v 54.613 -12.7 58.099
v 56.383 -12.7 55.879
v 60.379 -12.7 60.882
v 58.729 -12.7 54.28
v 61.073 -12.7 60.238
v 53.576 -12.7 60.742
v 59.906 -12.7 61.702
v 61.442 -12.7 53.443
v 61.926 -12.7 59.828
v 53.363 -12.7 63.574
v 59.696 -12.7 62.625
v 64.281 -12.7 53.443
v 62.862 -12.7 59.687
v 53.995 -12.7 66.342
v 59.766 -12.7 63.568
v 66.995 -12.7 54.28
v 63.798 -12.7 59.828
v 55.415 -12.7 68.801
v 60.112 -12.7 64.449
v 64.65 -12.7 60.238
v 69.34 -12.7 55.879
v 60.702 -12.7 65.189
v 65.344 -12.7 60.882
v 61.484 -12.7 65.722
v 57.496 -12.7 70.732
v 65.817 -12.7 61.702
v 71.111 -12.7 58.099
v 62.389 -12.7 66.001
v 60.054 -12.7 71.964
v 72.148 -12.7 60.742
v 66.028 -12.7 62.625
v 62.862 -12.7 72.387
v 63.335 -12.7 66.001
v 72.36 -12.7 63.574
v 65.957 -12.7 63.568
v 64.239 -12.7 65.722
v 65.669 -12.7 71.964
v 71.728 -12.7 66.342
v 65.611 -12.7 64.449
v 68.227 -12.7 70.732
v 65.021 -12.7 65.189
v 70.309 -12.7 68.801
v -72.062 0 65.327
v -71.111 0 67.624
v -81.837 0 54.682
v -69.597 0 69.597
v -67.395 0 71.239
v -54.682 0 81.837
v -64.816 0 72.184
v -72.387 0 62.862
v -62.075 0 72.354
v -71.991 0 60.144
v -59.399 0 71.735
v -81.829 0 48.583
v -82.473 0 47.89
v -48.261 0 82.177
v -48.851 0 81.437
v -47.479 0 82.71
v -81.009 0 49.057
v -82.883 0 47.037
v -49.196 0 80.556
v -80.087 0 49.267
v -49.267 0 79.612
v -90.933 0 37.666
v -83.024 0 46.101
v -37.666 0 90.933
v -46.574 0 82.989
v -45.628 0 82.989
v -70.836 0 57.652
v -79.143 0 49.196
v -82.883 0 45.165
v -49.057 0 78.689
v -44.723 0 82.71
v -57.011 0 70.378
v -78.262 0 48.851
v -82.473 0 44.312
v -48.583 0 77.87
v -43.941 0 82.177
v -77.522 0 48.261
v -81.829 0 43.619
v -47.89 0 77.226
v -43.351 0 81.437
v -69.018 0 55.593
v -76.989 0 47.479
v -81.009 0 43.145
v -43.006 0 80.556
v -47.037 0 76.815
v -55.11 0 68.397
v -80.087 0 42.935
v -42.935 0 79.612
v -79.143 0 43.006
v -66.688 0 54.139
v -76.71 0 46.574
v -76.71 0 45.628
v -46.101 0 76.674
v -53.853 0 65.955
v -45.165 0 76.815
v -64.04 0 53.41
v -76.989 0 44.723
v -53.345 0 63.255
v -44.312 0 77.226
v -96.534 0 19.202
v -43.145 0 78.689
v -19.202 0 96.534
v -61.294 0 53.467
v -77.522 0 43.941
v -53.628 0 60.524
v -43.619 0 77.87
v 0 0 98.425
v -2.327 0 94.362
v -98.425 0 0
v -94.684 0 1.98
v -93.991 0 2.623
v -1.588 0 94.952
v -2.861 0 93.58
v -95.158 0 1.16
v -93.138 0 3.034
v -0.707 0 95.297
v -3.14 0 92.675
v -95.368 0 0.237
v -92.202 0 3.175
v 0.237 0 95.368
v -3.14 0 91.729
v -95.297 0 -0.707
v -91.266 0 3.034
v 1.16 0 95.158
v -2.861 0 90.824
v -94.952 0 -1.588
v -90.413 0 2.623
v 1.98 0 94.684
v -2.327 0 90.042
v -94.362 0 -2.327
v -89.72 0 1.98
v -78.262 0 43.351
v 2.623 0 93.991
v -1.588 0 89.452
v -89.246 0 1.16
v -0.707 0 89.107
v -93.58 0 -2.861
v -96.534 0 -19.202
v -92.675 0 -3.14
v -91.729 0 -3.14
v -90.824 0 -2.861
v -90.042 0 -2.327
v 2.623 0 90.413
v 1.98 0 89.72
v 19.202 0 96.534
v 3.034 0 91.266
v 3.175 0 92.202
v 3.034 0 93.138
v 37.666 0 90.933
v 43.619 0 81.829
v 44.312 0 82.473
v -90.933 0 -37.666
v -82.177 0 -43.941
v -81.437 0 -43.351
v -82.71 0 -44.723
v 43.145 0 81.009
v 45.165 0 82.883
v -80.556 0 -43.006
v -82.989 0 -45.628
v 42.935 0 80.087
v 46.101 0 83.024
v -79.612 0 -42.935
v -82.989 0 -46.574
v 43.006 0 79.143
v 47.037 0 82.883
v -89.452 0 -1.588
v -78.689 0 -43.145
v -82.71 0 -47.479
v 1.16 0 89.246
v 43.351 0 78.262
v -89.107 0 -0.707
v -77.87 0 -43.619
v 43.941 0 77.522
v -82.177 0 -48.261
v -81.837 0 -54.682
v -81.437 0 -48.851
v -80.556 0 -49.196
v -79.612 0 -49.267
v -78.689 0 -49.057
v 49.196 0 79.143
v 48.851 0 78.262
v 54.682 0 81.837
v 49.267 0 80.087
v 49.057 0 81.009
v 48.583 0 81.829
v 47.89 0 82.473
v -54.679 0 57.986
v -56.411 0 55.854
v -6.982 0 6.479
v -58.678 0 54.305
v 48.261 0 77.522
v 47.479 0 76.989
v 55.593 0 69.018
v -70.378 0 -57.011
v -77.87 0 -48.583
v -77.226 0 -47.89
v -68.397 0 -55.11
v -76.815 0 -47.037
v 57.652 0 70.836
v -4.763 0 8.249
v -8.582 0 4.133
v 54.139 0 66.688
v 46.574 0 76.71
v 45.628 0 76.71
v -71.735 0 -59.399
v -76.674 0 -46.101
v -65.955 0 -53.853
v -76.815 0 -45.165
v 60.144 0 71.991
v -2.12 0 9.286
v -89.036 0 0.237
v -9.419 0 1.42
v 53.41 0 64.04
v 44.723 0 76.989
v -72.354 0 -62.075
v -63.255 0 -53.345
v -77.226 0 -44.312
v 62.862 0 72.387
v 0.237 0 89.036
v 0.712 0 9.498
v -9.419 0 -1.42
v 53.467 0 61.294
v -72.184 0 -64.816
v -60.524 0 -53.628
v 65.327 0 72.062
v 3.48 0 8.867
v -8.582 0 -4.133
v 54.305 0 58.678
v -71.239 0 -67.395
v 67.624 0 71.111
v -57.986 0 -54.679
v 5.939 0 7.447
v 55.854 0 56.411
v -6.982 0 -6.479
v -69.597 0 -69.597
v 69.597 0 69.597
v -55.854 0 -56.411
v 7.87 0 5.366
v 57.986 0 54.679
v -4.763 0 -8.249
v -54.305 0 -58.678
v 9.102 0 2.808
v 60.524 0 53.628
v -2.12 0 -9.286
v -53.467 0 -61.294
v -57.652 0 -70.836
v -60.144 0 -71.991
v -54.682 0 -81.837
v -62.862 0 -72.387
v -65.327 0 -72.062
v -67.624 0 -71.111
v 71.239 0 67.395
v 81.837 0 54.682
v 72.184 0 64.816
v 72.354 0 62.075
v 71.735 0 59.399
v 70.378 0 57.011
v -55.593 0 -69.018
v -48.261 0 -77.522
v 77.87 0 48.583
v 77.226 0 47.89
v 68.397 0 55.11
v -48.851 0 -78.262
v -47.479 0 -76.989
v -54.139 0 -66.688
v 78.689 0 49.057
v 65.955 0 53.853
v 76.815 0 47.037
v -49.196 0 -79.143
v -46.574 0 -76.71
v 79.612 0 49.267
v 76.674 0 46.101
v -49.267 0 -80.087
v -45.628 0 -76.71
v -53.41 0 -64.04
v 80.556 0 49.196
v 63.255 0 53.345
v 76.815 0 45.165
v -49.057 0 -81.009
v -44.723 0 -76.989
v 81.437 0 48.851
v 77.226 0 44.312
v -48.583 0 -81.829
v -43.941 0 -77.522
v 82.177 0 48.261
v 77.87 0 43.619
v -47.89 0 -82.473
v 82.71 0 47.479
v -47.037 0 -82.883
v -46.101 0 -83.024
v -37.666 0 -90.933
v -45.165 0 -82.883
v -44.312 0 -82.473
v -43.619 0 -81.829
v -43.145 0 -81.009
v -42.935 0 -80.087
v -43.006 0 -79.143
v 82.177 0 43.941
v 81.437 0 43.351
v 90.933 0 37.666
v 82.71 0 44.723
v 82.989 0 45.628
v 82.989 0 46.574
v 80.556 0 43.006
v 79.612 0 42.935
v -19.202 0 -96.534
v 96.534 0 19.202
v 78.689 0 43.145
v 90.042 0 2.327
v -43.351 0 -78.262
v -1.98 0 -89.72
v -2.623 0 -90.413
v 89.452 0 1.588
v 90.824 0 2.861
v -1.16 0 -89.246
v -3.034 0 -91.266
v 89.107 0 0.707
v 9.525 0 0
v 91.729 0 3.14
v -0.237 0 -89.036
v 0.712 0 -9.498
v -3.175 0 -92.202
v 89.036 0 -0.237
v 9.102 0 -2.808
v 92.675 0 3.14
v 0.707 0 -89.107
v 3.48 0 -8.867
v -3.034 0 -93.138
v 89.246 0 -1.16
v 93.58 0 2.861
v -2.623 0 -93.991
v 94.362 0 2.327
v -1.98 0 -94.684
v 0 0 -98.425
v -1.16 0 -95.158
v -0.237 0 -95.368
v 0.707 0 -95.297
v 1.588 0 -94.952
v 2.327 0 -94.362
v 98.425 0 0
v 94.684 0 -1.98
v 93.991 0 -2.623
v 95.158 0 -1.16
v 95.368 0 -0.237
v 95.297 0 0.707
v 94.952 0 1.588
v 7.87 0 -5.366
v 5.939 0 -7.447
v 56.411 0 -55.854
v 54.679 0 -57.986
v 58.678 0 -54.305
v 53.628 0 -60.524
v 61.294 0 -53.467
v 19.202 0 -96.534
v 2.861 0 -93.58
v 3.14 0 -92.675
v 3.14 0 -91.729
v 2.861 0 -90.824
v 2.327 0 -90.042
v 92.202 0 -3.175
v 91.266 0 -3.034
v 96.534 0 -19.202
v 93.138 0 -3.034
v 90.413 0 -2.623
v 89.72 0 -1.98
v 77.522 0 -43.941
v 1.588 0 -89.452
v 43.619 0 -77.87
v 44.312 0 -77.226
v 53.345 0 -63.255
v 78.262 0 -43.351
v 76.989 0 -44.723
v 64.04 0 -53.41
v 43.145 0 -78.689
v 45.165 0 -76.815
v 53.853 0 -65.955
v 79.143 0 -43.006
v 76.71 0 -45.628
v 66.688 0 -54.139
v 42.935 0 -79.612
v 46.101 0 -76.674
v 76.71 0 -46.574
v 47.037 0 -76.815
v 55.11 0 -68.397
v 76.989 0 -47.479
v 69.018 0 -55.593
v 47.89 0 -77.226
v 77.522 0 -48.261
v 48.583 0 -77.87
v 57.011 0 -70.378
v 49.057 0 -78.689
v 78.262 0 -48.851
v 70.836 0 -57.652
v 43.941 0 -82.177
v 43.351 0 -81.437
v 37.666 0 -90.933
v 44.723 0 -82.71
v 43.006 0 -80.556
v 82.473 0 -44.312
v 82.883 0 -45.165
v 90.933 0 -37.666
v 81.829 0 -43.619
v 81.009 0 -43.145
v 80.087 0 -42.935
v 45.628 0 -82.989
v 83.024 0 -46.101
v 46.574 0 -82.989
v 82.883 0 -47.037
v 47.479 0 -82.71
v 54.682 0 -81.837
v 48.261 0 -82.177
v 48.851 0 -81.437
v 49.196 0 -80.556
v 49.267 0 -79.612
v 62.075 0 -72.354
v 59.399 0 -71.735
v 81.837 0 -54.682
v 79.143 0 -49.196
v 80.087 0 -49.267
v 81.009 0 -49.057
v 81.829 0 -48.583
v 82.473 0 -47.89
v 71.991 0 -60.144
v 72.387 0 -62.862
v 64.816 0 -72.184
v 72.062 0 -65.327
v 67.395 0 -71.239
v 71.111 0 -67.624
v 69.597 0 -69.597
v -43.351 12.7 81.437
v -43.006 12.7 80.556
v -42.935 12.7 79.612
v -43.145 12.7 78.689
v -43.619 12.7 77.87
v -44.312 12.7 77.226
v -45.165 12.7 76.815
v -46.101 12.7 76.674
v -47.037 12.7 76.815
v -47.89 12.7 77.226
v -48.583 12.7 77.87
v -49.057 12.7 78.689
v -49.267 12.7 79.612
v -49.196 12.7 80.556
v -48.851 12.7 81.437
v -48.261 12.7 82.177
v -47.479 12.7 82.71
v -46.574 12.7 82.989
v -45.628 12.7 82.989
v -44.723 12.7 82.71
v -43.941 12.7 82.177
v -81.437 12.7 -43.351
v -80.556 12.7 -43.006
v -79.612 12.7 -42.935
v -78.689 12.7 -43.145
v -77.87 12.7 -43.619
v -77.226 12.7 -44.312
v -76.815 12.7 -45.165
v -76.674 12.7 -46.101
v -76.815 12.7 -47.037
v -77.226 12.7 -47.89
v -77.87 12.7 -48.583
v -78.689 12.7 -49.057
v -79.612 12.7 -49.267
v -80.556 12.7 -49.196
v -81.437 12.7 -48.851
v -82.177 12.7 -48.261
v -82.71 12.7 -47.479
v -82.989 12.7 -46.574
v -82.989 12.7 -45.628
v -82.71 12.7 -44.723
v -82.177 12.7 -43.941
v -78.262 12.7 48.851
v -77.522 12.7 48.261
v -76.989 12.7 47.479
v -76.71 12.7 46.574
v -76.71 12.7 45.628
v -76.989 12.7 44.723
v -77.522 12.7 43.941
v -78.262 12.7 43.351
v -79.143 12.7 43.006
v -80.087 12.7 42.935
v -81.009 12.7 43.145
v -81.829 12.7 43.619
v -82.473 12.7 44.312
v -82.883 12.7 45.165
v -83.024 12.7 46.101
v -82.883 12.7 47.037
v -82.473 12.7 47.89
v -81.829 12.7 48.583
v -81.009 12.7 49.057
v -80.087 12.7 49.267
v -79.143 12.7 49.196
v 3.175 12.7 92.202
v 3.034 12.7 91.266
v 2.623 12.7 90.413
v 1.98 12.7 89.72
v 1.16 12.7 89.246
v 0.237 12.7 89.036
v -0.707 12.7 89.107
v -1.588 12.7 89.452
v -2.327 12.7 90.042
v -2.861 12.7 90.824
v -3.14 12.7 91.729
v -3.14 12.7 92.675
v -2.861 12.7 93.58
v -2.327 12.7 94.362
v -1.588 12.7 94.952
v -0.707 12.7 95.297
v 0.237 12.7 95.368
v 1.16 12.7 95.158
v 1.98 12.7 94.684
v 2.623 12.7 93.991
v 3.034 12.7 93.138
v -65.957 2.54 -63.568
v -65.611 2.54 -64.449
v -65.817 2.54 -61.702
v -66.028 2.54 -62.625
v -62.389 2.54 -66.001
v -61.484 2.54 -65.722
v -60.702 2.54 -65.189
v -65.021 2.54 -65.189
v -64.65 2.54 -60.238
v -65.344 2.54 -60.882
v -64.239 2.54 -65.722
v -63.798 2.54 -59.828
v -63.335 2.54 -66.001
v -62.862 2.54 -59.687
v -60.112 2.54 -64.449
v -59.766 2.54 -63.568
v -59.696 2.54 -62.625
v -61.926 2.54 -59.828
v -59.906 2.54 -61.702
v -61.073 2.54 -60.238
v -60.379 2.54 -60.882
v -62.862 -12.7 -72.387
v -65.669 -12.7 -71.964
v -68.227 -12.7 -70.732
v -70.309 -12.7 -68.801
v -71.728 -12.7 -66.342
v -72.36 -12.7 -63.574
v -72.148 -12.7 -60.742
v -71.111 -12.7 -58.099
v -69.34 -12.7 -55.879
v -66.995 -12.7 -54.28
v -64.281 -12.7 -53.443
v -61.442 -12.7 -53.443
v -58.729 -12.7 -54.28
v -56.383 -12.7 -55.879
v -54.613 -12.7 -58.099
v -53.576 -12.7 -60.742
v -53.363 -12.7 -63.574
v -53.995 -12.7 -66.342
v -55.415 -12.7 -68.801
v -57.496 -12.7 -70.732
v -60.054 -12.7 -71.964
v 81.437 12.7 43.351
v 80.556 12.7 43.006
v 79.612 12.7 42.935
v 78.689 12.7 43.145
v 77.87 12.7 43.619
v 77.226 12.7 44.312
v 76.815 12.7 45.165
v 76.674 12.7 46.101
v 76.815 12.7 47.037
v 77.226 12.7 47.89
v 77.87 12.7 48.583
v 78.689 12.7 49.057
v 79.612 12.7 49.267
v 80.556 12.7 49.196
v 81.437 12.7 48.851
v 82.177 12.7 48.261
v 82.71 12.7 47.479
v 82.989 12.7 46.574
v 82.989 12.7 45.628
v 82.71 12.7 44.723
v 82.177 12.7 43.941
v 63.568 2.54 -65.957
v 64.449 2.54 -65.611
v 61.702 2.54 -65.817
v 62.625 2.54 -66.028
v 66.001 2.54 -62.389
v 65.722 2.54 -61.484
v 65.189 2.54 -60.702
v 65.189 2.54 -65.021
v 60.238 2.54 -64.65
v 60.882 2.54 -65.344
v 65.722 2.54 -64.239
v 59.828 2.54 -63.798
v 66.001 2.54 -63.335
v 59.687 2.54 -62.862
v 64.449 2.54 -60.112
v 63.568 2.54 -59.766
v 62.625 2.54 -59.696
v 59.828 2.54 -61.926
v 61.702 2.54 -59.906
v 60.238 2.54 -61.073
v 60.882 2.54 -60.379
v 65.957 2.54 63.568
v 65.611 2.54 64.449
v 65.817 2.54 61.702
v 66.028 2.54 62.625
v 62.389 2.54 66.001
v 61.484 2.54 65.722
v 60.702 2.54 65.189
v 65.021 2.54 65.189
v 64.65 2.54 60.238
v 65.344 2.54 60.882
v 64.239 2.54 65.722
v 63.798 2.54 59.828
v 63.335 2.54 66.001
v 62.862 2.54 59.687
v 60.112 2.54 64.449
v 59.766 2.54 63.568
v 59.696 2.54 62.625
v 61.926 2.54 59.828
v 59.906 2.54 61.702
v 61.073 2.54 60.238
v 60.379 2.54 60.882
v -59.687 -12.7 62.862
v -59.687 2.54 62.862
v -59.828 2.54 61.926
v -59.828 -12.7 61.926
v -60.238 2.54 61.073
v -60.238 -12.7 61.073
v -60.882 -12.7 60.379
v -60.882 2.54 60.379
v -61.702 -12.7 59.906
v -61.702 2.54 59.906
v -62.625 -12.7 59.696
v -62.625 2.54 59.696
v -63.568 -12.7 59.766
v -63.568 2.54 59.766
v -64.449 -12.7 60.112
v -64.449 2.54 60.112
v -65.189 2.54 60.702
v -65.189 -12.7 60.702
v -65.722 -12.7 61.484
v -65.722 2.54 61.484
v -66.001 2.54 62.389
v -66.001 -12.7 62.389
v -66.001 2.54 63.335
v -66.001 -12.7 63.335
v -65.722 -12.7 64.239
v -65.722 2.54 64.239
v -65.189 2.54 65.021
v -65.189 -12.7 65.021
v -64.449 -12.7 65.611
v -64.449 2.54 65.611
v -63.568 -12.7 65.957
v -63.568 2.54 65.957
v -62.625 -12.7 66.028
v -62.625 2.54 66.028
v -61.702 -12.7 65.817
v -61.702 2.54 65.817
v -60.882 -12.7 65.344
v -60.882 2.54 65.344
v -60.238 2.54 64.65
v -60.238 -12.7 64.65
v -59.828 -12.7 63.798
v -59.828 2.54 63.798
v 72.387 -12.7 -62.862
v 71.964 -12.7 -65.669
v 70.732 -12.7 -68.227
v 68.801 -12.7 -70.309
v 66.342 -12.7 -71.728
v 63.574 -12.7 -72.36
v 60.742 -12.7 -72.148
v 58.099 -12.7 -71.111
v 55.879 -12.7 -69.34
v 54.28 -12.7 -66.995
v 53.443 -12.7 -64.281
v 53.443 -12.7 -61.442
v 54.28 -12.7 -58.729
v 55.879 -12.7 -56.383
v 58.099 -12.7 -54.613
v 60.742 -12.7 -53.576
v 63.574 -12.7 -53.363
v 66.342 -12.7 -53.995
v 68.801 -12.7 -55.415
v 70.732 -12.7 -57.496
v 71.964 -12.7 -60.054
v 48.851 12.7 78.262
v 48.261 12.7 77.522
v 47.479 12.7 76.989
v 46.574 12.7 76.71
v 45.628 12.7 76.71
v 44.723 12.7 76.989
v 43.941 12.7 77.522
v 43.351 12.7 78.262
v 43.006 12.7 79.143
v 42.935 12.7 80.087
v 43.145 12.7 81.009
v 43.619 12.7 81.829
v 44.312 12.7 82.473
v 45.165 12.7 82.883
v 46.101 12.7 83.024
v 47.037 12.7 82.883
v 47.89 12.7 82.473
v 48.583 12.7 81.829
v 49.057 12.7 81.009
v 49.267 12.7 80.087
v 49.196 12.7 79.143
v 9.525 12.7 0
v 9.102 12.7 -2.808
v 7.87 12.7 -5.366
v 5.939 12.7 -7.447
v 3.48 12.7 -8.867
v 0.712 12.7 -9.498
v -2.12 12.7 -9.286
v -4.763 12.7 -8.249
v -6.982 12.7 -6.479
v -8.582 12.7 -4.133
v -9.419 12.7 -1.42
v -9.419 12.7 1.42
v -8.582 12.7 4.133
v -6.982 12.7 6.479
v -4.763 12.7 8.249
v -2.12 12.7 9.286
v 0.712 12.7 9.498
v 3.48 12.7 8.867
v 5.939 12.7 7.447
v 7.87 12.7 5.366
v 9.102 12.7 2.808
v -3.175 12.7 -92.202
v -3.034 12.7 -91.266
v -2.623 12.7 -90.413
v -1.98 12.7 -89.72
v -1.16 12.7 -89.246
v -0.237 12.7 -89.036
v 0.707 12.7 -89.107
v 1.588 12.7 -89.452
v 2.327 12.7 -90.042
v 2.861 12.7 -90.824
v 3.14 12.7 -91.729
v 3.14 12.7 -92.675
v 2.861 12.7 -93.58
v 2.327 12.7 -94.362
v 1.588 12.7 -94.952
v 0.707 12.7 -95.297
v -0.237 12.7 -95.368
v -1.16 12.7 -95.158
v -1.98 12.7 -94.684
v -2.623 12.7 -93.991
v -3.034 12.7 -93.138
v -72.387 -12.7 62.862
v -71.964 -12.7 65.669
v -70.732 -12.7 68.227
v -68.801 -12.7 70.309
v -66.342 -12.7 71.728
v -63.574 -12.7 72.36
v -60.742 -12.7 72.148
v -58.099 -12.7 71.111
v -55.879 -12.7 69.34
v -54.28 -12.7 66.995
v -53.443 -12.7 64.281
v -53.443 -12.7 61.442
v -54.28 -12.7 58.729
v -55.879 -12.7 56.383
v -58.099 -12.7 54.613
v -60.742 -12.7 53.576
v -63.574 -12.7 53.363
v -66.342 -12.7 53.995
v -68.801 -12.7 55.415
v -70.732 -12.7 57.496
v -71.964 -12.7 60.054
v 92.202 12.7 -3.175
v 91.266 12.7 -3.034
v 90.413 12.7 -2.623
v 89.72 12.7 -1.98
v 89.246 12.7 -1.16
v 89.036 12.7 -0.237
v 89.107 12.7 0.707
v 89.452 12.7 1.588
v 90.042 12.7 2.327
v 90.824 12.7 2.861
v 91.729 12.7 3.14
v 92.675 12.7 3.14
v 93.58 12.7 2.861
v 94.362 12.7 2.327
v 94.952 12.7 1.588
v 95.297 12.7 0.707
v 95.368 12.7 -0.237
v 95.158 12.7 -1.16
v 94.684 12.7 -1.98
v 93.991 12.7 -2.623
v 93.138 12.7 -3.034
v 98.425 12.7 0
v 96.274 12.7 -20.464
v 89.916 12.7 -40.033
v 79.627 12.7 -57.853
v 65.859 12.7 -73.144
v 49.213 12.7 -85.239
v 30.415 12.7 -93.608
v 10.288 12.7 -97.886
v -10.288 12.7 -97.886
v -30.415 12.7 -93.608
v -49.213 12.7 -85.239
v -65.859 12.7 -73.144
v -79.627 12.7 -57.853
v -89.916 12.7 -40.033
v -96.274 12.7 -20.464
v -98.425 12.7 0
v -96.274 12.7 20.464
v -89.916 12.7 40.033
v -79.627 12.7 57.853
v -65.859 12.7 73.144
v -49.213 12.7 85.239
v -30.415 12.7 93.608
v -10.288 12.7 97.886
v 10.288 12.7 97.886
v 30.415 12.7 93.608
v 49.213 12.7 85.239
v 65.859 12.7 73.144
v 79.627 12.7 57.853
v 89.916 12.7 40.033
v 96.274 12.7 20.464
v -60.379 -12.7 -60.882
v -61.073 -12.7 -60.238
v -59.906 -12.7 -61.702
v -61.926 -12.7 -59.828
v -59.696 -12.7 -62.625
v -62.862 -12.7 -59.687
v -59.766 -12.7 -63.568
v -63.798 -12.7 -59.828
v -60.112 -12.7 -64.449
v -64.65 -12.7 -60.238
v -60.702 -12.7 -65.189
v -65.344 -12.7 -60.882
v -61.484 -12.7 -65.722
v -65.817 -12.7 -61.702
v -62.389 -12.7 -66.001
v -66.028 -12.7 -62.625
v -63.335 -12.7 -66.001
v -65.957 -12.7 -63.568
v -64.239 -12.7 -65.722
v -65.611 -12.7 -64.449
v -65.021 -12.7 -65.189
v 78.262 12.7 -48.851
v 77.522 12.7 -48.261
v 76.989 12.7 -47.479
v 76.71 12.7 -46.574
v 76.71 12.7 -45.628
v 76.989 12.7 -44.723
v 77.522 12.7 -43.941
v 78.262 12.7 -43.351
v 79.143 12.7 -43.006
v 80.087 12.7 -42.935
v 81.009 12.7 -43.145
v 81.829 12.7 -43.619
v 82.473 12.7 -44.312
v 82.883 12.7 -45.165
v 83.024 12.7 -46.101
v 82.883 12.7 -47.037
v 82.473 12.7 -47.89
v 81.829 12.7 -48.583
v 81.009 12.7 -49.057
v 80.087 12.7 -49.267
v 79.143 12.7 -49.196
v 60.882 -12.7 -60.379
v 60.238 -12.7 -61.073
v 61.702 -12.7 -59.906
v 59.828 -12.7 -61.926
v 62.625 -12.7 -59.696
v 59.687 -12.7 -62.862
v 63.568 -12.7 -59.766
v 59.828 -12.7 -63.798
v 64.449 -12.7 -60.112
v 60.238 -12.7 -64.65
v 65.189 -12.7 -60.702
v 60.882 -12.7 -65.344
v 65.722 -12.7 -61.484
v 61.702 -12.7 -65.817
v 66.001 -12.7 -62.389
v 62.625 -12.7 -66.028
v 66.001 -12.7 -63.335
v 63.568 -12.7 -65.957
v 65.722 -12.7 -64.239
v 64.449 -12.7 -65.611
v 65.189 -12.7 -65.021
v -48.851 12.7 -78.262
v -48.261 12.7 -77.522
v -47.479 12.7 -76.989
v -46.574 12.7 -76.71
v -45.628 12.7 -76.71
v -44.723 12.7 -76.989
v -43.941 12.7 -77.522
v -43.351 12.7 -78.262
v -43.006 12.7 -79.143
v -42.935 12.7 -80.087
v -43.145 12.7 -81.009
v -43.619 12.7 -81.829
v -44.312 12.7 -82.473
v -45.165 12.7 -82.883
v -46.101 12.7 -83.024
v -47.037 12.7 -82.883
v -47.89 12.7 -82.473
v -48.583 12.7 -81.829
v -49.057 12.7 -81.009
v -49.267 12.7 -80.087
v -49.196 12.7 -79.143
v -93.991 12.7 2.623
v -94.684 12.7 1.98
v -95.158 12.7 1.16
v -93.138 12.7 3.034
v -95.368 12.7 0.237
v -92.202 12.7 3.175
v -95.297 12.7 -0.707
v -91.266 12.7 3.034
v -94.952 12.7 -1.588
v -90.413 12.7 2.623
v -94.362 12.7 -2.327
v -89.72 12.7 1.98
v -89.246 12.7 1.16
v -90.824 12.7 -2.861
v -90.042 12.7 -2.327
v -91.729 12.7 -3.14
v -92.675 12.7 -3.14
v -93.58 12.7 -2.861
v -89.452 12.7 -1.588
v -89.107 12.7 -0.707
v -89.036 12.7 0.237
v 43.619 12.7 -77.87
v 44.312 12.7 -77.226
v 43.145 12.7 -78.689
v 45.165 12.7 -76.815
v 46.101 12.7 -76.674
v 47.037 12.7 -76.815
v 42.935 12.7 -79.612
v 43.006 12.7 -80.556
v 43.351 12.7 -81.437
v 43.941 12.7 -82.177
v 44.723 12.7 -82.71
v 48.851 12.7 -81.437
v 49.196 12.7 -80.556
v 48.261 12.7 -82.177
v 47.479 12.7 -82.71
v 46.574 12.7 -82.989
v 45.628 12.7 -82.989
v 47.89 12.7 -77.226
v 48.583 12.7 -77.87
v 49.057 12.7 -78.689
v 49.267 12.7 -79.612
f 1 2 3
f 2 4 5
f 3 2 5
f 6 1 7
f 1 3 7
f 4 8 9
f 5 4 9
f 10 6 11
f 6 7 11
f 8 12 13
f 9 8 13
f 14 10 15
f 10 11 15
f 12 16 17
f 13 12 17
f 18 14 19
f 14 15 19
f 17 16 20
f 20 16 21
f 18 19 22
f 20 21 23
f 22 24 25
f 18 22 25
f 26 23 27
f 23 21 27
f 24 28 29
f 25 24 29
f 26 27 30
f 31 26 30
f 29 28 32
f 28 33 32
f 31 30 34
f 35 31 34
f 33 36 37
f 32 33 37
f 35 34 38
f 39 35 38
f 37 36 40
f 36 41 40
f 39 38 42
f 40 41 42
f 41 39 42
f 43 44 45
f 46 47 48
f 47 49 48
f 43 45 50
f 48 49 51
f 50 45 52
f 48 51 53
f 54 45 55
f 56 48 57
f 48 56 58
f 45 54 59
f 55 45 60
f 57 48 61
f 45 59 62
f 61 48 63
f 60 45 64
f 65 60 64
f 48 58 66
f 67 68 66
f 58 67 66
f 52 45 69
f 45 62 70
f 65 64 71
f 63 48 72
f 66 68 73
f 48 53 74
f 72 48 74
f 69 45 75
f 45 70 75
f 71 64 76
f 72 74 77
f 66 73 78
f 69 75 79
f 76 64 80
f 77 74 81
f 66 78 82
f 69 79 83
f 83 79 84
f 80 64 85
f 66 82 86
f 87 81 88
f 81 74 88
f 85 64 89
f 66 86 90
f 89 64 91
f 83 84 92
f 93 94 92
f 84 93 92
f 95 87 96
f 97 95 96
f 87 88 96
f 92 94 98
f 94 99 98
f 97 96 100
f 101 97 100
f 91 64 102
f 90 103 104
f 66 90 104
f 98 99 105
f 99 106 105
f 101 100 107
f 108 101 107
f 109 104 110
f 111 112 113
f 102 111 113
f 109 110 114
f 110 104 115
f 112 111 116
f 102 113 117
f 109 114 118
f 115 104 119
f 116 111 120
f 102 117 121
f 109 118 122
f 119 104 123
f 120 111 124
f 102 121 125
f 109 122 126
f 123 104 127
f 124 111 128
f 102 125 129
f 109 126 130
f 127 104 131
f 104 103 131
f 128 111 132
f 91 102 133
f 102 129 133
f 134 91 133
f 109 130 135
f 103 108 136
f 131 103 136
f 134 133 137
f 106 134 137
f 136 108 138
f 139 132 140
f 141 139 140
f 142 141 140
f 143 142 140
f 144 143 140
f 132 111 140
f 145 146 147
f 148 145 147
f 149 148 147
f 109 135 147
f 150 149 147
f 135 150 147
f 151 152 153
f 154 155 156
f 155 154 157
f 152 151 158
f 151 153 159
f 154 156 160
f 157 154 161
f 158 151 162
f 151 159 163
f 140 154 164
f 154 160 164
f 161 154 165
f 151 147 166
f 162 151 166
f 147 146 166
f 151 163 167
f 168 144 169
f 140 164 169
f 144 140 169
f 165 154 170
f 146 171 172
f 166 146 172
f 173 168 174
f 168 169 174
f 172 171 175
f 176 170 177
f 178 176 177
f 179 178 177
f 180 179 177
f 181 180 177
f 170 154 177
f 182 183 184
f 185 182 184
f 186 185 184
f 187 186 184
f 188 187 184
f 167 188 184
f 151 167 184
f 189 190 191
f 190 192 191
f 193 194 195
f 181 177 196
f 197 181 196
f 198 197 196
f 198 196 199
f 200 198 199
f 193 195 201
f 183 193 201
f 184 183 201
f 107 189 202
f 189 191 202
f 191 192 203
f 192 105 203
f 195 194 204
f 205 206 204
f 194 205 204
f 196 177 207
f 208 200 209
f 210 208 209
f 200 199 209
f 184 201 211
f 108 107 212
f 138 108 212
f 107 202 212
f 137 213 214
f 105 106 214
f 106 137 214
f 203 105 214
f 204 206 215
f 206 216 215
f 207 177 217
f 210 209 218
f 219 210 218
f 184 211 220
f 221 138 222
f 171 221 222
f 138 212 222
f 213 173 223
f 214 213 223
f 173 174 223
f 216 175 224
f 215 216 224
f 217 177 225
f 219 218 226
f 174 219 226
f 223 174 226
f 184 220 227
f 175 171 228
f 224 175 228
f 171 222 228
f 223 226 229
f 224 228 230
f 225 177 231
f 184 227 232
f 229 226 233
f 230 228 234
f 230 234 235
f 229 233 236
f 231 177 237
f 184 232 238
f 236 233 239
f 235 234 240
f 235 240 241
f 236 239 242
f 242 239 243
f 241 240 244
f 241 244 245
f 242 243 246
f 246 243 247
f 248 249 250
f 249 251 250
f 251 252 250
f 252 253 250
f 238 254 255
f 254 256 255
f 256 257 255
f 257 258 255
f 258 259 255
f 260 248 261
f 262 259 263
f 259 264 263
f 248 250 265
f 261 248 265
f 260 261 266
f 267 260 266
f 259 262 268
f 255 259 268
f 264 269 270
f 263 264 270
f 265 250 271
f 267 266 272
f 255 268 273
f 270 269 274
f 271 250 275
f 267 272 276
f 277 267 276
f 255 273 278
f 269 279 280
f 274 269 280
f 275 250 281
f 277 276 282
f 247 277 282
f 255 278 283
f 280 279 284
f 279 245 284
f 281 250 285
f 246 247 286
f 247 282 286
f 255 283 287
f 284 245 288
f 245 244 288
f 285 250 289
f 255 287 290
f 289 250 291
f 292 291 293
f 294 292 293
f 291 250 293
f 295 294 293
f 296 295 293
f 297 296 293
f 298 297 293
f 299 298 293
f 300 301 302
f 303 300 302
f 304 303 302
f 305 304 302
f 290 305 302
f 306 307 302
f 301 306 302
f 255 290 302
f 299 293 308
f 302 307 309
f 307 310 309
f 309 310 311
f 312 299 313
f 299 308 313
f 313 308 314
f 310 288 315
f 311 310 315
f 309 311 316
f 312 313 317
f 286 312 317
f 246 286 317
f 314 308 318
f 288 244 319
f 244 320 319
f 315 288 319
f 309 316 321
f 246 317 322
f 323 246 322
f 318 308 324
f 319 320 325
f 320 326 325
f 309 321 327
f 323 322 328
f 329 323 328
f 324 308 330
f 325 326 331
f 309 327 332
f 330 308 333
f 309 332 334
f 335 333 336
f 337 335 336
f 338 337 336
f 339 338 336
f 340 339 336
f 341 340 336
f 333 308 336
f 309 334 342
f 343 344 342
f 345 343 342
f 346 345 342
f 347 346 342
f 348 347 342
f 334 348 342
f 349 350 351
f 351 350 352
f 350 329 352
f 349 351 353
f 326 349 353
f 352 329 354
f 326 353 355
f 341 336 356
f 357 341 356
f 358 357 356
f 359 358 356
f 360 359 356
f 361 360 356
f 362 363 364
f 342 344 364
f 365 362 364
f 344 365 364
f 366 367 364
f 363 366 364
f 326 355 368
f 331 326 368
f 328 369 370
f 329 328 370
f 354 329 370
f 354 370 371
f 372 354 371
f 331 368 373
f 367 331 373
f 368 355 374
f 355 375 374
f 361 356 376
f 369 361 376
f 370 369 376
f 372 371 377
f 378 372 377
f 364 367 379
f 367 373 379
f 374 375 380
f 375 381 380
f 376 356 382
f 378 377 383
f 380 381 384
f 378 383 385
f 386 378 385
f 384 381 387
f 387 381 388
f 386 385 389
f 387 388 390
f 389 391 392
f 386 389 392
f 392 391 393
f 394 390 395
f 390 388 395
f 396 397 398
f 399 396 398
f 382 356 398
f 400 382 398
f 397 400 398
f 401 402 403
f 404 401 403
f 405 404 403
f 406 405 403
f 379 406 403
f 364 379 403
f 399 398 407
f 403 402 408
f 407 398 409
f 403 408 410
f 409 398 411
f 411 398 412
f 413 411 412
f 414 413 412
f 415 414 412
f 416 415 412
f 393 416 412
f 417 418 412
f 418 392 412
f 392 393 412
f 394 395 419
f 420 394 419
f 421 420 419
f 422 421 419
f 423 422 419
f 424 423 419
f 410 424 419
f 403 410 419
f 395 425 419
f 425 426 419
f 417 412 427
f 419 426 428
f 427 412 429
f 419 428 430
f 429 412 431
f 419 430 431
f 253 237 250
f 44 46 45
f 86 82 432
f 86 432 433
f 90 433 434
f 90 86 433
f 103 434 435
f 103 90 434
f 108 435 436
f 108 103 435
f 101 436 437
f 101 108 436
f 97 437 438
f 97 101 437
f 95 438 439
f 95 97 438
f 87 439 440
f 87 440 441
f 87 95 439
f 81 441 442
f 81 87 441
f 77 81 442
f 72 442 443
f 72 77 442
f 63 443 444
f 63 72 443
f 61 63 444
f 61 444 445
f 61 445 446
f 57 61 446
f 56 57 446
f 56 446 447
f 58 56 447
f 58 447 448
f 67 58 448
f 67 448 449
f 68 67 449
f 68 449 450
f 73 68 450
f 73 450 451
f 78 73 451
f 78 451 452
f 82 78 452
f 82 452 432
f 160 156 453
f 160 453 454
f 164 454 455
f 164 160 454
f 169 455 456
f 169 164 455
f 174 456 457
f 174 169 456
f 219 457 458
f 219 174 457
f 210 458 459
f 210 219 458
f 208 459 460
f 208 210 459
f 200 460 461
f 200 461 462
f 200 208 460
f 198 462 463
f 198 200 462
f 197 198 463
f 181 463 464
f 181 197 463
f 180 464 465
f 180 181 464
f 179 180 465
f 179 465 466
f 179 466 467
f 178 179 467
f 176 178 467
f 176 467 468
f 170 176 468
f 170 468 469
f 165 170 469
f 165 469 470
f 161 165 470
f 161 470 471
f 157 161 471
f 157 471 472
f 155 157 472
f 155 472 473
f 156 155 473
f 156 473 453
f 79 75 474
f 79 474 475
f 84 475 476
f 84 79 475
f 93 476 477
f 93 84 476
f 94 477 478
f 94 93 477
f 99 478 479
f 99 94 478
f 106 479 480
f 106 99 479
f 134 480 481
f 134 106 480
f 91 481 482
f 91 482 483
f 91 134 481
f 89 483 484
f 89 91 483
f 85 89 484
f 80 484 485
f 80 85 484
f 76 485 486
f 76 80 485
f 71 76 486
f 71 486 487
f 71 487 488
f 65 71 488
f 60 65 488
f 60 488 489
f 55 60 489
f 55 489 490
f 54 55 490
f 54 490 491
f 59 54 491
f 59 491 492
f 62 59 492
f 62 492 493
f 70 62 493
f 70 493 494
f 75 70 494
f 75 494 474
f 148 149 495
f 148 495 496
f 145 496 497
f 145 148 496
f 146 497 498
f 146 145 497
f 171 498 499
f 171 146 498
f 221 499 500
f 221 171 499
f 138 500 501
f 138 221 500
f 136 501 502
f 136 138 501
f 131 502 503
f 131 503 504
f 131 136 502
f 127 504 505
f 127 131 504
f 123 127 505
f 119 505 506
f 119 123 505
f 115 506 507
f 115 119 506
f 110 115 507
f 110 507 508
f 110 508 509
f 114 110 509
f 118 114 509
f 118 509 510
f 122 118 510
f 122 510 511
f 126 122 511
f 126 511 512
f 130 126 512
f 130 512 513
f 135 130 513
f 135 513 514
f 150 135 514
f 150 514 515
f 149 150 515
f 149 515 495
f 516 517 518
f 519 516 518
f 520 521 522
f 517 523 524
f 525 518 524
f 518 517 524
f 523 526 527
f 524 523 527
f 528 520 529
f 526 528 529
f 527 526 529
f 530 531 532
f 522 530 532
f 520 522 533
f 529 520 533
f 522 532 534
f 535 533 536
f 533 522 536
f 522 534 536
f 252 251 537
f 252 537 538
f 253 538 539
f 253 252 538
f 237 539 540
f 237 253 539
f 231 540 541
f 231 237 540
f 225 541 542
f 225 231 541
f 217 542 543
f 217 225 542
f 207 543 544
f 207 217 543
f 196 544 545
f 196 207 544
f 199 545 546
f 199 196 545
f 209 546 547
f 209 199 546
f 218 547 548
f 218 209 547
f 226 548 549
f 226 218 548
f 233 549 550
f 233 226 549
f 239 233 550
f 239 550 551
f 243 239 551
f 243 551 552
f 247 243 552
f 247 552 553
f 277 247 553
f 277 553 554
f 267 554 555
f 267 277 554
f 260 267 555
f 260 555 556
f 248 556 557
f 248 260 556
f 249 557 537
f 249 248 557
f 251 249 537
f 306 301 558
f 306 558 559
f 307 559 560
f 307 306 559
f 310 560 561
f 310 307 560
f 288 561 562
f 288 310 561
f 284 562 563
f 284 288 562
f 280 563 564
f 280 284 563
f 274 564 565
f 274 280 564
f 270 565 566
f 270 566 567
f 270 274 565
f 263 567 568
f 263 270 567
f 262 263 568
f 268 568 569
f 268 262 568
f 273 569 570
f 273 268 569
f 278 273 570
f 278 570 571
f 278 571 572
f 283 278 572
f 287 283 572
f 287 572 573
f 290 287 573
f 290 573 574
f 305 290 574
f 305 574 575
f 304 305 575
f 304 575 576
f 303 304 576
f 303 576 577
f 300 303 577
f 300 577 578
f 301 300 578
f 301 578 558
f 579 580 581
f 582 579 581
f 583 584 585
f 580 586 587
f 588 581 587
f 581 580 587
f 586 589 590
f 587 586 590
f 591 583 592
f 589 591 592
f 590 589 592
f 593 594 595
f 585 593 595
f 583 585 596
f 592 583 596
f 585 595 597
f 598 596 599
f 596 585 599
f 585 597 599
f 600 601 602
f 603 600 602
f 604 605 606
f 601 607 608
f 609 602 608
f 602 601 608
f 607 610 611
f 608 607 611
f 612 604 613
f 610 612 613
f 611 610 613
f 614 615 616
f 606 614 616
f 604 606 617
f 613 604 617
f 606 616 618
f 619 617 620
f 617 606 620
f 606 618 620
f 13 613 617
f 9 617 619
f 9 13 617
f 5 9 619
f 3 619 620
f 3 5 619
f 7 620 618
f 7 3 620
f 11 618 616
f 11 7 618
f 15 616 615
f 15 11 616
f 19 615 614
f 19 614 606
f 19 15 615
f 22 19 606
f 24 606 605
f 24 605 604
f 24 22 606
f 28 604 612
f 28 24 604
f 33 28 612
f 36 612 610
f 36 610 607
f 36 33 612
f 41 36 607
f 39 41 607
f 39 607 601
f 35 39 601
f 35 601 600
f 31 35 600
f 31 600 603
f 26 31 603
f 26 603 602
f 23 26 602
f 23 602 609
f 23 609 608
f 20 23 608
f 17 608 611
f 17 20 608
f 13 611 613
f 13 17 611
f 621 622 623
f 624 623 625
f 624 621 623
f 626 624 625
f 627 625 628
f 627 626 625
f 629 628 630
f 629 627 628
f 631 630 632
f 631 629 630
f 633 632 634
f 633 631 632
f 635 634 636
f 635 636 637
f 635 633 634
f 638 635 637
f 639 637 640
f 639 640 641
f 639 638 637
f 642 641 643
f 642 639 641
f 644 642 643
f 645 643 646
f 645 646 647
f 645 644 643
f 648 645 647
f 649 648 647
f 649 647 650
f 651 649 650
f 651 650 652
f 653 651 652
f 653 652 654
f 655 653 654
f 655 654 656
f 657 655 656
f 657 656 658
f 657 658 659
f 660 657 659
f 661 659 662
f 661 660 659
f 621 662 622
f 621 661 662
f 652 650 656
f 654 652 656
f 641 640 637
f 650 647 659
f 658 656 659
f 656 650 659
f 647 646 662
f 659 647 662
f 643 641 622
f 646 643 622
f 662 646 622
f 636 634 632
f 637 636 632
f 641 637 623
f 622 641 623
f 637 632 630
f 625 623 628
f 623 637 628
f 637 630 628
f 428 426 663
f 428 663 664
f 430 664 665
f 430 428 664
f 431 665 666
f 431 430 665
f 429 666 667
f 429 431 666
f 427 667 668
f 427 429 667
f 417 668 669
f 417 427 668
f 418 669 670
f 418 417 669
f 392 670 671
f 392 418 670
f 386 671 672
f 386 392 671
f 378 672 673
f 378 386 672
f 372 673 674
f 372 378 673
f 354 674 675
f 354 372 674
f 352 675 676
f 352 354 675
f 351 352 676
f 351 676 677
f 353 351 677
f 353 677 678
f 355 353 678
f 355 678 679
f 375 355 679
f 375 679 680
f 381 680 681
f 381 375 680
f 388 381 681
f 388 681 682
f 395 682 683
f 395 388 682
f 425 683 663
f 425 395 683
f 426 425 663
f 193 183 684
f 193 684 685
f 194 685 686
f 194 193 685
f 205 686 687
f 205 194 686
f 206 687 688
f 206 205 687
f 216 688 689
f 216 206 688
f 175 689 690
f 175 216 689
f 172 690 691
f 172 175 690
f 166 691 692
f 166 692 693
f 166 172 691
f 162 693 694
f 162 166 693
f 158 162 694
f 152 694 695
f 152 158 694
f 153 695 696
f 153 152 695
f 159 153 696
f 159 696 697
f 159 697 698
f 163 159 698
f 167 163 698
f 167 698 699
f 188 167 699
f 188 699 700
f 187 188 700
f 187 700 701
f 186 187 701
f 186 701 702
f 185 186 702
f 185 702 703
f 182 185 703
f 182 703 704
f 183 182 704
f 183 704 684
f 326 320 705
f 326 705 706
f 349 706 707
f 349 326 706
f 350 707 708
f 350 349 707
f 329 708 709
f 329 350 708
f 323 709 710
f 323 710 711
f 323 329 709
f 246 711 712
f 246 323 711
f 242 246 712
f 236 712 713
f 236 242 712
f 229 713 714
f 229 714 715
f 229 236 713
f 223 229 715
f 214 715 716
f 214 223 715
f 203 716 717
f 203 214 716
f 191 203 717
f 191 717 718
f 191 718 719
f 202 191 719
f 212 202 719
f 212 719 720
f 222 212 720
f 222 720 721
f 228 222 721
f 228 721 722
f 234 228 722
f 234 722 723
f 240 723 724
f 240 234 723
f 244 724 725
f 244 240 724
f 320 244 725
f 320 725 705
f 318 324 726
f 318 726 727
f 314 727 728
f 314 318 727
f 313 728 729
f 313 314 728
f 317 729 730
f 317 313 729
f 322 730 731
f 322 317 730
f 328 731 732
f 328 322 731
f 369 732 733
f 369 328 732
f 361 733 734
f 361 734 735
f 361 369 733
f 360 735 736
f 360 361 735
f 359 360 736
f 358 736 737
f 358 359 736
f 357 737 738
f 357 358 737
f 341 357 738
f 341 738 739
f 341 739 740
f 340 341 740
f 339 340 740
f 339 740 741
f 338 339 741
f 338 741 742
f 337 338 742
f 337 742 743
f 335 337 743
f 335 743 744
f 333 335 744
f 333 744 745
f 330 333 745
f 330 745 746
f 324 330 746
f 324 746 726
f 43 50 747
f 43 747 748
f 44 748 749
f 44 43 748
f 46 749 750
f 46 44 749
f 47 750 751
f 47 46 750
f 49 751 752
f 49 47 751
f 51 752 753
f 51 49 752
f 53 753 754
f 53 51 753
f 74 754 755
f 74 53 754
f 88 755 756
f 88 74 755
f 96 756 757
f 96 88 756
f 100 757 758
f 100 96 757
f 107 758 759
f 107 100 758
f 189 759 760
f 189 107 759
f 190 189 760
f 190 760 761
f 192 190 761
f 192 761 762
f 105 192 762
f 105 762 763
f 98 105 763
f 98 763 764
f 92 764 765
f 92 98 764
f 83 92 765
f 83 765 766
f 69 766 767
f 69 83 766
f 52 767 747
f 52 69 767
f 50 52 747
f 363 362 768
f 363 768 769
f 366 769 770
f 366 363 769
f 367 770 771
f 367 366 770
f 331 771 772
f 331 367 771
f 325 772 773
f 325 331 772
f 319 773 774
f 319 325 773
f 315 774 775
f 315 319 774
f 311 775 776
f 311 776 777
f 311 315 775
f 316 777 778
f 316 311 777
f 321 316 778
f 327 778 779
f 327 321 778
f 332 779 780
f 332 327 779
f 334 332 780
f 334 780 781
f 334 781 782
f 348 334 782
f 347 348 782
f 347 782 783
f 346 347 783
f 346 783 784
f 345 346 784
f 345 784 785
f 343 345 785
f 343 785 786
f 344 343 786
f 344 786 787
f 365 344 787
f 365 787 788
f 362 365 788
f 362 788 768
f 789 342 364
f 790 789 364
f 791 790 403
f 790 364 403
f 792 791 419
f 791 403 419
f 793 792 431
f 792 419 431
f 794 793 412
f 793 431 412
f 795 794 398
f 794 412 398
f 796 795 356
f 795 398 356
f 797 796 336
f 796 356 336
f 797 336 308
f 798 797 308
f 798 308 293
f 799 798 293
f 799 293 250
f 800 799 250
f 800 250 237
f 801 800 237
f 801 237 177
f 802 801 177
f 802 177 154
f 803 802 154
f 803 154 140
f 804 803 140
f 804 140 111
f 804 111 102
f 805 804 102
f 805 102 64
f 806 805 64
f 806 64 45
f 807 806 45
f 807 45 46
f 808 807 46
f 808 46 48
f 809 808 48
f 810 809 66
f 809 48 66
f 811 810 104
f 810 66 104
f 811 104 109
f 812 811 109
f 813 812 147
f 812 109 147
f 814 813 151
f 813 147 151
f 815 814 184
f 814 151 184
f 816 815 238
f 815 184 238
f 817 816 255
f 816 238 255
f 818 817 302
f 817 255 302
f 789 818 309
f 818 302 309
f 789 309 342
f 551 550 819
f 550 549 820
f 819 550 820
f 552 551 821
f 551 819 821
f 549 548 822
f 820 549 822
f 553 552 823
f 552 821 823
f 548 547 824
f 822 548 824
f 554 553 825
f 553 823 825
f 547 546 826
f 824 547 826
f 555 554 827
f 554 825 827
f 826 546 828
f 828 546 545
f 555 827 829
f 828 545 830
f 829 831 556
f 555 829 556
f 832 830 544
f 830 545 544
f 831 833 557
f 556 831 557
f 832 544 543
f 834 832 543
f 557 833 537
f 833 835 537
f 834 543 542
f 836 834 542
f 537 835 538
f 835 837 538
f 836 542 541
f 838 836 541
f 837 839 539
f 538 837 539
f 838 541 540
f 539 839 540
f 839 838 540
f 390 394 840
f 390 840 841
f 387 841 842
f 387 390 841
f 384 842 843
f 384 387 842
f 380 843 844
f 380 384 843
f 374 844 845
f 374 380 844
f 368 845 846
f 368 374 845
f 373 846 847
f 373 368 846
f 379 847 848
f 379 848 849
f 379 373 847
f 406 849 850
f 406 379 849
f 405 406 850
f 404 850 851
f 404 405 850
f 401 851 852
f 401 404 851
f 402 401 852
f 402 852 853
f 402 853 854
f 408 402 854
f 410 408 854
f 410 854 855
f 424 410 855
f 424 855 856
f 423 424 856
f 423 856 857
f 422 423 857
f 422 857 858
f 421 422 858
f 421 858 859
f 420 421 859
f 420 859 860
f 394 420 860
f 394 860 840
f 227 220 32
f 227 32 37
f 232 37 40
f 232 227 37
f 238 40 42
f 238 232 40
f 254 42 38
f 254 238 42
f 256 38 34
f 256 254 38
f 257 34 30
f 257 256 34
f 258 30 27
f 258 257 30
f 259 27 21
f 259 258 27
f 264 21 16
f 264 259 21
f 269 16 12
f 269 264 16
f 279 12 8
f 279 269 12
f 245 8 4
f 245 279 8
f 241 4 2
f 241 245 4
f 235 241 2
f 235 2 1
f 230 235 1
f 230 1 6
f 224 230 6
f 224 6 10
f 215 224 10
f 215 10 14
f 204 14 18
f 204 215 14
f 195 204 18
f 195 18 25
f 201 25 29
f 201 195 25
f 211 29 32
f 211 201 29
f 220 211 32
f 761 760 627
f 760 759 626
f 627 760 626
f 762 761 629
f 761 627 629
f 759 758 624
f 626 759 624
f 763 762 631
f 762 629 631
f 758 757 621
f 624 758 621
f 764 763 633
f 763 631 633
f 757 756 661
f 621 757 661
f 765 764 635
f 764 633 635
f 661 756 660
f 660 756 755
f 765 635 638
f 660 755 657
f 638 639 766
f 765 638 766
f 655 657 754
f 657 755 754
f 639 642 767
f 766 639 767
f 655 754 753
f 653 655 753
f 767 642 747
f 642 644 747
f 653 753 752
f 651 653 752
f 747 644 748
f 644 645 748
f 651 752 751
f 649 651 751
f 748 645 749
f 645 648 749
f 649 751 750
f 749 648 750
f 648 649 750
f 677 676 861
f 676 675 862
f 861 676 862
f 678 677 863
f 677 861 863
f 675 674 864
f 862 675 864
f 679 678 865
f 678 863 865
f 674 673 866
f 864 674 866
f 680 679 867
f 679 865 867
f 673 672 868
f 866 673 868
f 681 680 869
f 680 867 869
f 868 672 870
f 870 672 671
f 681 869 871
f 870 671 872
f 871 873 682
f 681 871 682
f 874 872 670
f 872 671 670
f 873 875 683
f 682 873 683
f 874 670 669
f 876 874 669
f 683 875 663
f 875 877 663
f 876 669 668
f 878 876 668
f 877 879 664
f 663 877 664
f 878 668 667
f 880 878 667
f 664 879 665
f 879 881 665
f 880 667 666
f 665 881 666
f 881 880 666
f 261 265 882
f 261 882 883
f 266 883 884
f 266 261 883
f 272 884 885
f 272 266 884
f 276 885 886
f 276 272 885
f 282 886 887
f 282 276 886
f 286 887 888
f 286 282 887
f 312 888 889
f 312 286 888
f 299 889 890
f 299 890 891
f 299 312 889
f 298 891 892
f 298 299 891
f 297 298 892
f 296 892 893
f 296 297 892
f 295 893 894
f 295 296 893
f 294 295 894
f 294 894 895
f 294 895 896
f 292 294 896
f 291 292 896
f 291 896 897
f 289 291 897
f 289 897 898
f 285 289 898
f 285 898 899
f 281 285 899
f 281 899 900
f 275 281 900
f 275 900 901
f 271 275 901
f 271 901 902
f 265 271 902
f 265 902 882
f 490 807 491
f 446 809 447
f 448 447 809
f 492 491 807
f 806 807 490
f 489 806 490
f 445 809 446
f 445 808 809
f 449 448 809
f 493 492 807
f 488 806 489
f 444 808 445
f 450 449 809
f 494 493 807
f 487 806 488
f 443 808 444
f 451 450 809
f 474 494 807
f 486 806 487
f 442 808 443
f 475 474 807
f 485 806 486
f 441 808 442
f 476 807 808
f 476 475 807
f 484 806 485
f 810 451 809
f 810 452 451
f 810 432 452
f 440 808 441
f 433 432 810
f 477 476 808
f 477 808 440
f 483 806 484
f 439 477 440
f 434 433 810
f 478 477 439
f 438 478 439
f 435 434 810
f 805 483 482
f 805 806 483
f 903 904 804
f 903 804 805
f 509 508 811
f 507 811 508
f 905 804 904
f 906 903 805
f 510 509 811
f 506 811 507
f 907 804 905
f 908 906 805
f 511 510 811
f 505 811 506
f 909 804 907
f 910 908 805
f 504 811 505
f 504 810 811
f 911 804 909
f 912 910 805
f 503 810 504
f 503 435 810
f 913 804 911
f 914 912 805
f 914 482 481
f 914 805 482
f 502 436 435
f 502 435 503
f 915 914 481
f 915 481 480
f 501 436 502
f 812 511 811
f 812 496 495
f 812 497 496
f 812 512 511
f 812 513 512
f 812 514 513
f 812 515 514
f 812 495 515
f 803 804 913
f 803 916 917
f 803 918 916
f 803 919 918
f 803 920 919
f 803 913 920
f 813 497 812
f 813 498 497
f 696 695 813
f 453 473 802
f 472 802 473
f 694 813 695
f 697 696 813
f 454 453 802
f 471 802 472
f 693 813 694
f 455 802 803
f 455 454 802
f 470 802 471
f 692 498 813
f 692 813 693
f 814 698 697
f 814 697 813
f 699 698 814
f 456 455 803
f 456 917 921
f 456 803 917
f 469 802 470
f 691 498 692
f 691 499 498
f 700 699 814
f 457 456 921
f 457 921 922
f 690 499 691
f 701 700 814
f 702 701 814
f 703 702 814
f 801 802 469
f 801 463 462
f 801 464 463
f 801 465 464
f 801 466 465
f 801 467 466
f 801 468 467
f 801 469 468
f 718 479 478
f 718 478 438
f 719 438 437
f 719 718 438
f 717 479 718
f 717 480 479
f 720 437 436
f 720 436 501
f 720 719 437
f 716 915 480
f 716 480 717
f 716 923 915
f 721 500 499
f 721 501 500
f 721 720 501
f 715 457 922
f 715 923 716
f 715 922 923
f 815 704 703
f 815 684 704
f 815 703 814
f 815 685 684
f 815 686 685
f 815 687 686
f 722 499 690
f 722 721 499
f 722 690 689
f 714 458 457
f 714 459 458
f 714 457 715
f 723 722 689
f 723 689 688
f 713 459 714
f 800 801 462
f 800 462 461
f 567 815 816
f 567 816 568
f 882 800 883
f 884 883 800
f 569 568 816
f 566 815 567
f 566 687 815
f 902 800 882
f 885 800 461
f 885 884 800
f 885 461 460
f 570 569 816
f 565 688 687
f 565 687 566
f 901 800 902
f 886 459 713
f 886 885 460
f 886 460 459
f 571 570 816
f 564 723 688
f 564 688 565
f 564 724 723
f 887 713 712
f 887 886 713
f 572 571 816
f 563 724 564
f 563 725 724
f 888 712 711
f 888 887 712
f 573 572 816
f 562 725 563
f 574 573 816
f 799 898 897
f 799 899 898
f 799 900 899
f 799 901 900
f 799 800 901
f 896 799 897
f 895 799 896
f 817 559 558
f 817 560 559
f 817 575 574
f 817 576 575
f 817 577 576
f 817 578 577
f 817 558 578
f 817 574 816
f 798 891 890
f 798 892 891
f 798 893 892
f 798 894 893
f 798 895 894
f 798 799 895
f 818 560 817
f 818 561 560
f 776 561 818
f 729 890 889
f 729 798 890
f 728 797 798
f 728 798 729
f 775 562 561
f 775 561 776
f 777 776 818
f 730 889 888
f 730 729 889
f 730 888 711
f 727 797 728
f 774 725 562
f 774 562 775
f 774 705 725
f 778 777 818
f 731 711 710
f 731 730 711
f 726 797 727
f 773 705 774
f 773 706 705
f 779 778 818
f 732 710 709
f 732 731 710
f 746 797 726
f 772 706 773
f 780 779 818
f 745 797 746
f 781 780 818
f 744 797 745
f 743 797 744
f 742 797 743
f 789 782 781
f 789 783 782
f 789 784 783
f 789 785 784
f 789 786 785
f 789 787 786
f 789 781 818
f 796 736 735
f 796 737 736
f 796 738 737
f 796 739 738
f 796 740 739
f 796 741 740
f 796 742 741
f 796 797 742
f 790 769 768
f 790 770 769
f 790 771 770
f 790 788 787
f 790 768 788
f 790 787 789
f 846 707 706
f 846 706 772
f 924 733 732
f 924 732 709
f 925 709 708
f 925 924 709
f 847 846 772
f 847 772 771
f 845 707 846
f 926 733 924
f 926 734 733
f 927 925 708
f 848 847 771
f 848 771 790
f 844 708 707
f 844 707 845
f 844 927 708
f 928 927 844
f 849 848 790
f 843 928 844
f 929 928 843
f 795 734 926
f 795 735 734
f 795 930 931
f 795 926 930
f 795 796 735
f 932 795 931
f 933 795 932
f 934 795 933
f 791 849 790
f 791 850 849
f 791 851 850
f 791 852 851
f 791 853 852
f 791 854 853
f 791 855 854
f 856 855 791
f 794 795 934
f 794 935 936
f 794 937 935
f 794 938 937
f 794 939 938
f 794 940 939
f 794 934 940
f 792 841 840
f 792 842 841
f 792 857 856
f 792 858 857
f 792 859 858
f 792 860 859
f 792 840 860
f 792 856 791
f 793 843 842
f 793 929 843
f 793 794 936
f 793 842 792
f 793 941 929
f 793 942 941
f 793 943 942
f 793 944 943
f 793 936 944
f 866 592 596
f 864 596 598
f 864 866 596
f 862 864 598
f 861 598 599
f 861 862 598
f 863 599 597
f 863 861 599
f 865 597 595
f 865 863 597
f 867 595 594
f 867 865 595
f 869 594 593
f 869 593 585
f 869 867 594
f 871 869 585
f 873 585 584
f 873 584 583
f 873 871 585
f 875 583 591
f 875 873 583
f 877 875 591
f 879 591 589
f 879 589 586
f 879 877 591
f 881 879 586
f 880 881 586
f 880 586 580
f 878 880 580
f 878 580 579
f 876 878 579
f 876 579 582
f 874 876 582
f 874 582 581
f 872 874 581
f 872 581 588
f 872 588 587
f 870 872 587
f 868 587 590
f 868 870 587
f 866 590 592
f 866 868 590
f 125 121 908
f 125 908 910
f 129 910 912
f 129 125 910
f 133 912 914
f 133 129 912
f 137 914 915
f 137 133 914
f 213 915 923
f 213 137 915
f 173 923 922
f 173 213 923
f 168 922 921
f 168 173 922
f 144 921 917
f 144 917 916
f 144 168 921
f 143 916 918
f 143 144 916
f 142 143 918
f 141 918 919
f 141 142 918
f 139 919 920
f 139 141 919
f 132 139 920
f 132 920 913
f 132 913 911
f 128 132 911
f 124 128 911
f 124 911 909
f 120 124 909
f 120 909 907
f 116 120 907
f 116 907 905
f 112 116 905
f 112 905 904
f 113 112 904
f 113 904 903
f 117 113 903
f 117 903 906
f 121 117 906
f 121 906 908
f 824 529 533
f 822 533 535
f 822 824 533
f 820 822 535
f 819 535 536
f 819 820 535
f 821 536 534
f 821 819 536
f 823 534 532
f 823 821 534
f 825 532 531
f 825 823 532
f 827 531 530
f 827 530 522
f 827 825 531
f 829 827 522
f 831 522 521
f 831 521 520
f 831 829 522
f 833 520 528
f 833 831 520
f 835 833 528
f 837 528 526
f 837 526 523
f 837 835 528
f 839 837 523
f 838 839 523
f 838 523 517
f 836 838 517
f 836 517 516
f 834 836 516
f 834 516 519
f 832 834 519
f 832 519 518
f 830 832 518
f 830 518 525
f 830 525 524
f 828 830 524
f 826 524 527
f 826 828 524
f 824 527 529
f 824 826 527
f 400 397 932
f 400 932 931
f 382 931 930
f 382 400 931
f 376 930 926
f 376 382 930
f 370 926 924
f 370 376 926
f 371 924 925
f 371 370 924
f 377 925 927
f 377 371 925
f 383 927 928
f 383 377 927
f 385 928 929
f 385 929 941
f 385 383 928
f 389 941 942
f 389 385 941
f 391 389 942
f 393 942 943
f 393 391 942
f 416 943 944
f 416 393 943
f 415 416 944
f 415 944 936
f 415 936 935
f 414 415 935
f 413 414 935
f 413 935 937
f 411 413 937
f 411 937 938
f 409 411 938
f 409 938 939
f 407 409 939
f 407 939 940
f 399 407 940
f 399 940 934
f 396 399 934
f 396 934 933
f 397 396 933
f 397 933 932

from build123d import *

# Parameters (mm, degrees)
SKETCH2_R               = 98.425
BOSS_EXTRUDE1_DEPTH     = 12.7
SKETCH3_R               = 9.525
CUT_EXTRUDE4_DEPTH      = 12.7
CUT_EXTRUDE4_DEPTH_BACK = 12.7
CUT_EXTRUDE9_START      = -2.54
SKETCH5_R               = 3.175
CUT_EXTRUDE9_DEPTH      = 15.24
CIRPATTERN1_COUNT       = 12
SKETCH6_R               = 9.525
BOSS_EXTRUDE2_DEPTH     = 12.7
CUT_EXTRUDE10_START     = -12.7
SKETCH8_R               = 3.175
CUT_EXTRUDE10_DEPTH     = 15.24
CIRPATTERN2_COUNT       = 4


with BuildPart() as part:
    # Sketch2 → Boss-Extrude1 (new body)
    with BuildSketch(Plane(origin=(0, 0, 0), x_dir=(1, 0, 0), z_dir=(0, 1, 0))):
        Circle(SKETCH2_R)
    extrude(amount=BOSS_EXTRUDE1_DEPTH)

    # Sketch3 → Cut-Extrude4 (cut, two sides)
    with BuildSketch(Plane(origin=(0, 0, 0), x_dir=(1, 0, 0), z_dir=(0, 1, 0))) as cut_extrude4_sk:
        Circle(SKETCH3_R)
    extrude(amount=CUT_EXTRUDE4_DEPTH, mode=Mode.SUBTRACT)
    extrude(cut_extrude4_sk.sketch, amount=-CUT_EXTRUDE4_DEPTH_BACK, mode=Mode.SUBTRACT)

    # Sketch5 → Cut-Extrude9 (cut)
    with BuildSketch(Plane(origin=(0, 0, 0), x_dir=(1, 0, 0), z_dir=(0, 1, 0)).offset(CUT_EXTRUDE9_START)):
        with Locations((0, -92.202)):
            Circle(SKETCH5_R)
    cut_extrude9 = extrude(amount=CUT_EXTRUDE9_DEPTH, mode=Mode.SUBTRACT)

    # CirPattern1: Cut-Extrude9 ×12 about axis
    cirpattern1_axis = Axis((0, 0, 0), (0, 1, 0))
    for i in range(1, CIRPATTERN1_COUNT):
        add(cut_extrude9.rotate(cirpattern1_axis, i * 360 / CIRPATTERN1_COUNT), mode=Mode.SUBTRACT)

    # Sketch6 → Boss-Extrude2 (add)
    with BuildSketch(Plane(origin=(0, 0, 0), x_dir=(-1, 0, 0), z_dir=(0, 1, 0))):
        with Locations((62.861792847, 62.861792847)):
            Circle(SKETCH6_R)
    boss_extrude2 = extrude(amount=-BOSS_EXTRUDE2_DEPTH)

    # Sketch8 → Cut-Extrude10 (cut)
    with BuildSketch(Plane(origin=(0, 0, 0), x_dir=(1, 0, 0), z_dir=(0, 1, 0)).offset(CUT_EXTRUDE10_START)):
        with Locations((-62.861792847, -62.861792847)):
            Circle(SKETCH8_R)
    cut_extrude10 = extrude(amount=CUT_EXTRUDE10_DEPTH, mode=Mode.SUBTRACT)

    # CirPattern2: Boss-Extrude2, Cut-Extrude10 ×4 about axis
    cirpattern2_axis = Axis((0, 0, 0), (0, 1, 0))
    for i in range(1, CIRPATTERN2_COUNT):
        add(boss_extrude2.rotate(cirpattern2_axis, i * 360 / CIRPATTERN2_COUNT))
        add(cut_extrude10.rotate(cirpattern2_axis, i * 360 / CIRPATTERN2_COUNT), mode=Mode.SUBTRACT)


solid = part.part
